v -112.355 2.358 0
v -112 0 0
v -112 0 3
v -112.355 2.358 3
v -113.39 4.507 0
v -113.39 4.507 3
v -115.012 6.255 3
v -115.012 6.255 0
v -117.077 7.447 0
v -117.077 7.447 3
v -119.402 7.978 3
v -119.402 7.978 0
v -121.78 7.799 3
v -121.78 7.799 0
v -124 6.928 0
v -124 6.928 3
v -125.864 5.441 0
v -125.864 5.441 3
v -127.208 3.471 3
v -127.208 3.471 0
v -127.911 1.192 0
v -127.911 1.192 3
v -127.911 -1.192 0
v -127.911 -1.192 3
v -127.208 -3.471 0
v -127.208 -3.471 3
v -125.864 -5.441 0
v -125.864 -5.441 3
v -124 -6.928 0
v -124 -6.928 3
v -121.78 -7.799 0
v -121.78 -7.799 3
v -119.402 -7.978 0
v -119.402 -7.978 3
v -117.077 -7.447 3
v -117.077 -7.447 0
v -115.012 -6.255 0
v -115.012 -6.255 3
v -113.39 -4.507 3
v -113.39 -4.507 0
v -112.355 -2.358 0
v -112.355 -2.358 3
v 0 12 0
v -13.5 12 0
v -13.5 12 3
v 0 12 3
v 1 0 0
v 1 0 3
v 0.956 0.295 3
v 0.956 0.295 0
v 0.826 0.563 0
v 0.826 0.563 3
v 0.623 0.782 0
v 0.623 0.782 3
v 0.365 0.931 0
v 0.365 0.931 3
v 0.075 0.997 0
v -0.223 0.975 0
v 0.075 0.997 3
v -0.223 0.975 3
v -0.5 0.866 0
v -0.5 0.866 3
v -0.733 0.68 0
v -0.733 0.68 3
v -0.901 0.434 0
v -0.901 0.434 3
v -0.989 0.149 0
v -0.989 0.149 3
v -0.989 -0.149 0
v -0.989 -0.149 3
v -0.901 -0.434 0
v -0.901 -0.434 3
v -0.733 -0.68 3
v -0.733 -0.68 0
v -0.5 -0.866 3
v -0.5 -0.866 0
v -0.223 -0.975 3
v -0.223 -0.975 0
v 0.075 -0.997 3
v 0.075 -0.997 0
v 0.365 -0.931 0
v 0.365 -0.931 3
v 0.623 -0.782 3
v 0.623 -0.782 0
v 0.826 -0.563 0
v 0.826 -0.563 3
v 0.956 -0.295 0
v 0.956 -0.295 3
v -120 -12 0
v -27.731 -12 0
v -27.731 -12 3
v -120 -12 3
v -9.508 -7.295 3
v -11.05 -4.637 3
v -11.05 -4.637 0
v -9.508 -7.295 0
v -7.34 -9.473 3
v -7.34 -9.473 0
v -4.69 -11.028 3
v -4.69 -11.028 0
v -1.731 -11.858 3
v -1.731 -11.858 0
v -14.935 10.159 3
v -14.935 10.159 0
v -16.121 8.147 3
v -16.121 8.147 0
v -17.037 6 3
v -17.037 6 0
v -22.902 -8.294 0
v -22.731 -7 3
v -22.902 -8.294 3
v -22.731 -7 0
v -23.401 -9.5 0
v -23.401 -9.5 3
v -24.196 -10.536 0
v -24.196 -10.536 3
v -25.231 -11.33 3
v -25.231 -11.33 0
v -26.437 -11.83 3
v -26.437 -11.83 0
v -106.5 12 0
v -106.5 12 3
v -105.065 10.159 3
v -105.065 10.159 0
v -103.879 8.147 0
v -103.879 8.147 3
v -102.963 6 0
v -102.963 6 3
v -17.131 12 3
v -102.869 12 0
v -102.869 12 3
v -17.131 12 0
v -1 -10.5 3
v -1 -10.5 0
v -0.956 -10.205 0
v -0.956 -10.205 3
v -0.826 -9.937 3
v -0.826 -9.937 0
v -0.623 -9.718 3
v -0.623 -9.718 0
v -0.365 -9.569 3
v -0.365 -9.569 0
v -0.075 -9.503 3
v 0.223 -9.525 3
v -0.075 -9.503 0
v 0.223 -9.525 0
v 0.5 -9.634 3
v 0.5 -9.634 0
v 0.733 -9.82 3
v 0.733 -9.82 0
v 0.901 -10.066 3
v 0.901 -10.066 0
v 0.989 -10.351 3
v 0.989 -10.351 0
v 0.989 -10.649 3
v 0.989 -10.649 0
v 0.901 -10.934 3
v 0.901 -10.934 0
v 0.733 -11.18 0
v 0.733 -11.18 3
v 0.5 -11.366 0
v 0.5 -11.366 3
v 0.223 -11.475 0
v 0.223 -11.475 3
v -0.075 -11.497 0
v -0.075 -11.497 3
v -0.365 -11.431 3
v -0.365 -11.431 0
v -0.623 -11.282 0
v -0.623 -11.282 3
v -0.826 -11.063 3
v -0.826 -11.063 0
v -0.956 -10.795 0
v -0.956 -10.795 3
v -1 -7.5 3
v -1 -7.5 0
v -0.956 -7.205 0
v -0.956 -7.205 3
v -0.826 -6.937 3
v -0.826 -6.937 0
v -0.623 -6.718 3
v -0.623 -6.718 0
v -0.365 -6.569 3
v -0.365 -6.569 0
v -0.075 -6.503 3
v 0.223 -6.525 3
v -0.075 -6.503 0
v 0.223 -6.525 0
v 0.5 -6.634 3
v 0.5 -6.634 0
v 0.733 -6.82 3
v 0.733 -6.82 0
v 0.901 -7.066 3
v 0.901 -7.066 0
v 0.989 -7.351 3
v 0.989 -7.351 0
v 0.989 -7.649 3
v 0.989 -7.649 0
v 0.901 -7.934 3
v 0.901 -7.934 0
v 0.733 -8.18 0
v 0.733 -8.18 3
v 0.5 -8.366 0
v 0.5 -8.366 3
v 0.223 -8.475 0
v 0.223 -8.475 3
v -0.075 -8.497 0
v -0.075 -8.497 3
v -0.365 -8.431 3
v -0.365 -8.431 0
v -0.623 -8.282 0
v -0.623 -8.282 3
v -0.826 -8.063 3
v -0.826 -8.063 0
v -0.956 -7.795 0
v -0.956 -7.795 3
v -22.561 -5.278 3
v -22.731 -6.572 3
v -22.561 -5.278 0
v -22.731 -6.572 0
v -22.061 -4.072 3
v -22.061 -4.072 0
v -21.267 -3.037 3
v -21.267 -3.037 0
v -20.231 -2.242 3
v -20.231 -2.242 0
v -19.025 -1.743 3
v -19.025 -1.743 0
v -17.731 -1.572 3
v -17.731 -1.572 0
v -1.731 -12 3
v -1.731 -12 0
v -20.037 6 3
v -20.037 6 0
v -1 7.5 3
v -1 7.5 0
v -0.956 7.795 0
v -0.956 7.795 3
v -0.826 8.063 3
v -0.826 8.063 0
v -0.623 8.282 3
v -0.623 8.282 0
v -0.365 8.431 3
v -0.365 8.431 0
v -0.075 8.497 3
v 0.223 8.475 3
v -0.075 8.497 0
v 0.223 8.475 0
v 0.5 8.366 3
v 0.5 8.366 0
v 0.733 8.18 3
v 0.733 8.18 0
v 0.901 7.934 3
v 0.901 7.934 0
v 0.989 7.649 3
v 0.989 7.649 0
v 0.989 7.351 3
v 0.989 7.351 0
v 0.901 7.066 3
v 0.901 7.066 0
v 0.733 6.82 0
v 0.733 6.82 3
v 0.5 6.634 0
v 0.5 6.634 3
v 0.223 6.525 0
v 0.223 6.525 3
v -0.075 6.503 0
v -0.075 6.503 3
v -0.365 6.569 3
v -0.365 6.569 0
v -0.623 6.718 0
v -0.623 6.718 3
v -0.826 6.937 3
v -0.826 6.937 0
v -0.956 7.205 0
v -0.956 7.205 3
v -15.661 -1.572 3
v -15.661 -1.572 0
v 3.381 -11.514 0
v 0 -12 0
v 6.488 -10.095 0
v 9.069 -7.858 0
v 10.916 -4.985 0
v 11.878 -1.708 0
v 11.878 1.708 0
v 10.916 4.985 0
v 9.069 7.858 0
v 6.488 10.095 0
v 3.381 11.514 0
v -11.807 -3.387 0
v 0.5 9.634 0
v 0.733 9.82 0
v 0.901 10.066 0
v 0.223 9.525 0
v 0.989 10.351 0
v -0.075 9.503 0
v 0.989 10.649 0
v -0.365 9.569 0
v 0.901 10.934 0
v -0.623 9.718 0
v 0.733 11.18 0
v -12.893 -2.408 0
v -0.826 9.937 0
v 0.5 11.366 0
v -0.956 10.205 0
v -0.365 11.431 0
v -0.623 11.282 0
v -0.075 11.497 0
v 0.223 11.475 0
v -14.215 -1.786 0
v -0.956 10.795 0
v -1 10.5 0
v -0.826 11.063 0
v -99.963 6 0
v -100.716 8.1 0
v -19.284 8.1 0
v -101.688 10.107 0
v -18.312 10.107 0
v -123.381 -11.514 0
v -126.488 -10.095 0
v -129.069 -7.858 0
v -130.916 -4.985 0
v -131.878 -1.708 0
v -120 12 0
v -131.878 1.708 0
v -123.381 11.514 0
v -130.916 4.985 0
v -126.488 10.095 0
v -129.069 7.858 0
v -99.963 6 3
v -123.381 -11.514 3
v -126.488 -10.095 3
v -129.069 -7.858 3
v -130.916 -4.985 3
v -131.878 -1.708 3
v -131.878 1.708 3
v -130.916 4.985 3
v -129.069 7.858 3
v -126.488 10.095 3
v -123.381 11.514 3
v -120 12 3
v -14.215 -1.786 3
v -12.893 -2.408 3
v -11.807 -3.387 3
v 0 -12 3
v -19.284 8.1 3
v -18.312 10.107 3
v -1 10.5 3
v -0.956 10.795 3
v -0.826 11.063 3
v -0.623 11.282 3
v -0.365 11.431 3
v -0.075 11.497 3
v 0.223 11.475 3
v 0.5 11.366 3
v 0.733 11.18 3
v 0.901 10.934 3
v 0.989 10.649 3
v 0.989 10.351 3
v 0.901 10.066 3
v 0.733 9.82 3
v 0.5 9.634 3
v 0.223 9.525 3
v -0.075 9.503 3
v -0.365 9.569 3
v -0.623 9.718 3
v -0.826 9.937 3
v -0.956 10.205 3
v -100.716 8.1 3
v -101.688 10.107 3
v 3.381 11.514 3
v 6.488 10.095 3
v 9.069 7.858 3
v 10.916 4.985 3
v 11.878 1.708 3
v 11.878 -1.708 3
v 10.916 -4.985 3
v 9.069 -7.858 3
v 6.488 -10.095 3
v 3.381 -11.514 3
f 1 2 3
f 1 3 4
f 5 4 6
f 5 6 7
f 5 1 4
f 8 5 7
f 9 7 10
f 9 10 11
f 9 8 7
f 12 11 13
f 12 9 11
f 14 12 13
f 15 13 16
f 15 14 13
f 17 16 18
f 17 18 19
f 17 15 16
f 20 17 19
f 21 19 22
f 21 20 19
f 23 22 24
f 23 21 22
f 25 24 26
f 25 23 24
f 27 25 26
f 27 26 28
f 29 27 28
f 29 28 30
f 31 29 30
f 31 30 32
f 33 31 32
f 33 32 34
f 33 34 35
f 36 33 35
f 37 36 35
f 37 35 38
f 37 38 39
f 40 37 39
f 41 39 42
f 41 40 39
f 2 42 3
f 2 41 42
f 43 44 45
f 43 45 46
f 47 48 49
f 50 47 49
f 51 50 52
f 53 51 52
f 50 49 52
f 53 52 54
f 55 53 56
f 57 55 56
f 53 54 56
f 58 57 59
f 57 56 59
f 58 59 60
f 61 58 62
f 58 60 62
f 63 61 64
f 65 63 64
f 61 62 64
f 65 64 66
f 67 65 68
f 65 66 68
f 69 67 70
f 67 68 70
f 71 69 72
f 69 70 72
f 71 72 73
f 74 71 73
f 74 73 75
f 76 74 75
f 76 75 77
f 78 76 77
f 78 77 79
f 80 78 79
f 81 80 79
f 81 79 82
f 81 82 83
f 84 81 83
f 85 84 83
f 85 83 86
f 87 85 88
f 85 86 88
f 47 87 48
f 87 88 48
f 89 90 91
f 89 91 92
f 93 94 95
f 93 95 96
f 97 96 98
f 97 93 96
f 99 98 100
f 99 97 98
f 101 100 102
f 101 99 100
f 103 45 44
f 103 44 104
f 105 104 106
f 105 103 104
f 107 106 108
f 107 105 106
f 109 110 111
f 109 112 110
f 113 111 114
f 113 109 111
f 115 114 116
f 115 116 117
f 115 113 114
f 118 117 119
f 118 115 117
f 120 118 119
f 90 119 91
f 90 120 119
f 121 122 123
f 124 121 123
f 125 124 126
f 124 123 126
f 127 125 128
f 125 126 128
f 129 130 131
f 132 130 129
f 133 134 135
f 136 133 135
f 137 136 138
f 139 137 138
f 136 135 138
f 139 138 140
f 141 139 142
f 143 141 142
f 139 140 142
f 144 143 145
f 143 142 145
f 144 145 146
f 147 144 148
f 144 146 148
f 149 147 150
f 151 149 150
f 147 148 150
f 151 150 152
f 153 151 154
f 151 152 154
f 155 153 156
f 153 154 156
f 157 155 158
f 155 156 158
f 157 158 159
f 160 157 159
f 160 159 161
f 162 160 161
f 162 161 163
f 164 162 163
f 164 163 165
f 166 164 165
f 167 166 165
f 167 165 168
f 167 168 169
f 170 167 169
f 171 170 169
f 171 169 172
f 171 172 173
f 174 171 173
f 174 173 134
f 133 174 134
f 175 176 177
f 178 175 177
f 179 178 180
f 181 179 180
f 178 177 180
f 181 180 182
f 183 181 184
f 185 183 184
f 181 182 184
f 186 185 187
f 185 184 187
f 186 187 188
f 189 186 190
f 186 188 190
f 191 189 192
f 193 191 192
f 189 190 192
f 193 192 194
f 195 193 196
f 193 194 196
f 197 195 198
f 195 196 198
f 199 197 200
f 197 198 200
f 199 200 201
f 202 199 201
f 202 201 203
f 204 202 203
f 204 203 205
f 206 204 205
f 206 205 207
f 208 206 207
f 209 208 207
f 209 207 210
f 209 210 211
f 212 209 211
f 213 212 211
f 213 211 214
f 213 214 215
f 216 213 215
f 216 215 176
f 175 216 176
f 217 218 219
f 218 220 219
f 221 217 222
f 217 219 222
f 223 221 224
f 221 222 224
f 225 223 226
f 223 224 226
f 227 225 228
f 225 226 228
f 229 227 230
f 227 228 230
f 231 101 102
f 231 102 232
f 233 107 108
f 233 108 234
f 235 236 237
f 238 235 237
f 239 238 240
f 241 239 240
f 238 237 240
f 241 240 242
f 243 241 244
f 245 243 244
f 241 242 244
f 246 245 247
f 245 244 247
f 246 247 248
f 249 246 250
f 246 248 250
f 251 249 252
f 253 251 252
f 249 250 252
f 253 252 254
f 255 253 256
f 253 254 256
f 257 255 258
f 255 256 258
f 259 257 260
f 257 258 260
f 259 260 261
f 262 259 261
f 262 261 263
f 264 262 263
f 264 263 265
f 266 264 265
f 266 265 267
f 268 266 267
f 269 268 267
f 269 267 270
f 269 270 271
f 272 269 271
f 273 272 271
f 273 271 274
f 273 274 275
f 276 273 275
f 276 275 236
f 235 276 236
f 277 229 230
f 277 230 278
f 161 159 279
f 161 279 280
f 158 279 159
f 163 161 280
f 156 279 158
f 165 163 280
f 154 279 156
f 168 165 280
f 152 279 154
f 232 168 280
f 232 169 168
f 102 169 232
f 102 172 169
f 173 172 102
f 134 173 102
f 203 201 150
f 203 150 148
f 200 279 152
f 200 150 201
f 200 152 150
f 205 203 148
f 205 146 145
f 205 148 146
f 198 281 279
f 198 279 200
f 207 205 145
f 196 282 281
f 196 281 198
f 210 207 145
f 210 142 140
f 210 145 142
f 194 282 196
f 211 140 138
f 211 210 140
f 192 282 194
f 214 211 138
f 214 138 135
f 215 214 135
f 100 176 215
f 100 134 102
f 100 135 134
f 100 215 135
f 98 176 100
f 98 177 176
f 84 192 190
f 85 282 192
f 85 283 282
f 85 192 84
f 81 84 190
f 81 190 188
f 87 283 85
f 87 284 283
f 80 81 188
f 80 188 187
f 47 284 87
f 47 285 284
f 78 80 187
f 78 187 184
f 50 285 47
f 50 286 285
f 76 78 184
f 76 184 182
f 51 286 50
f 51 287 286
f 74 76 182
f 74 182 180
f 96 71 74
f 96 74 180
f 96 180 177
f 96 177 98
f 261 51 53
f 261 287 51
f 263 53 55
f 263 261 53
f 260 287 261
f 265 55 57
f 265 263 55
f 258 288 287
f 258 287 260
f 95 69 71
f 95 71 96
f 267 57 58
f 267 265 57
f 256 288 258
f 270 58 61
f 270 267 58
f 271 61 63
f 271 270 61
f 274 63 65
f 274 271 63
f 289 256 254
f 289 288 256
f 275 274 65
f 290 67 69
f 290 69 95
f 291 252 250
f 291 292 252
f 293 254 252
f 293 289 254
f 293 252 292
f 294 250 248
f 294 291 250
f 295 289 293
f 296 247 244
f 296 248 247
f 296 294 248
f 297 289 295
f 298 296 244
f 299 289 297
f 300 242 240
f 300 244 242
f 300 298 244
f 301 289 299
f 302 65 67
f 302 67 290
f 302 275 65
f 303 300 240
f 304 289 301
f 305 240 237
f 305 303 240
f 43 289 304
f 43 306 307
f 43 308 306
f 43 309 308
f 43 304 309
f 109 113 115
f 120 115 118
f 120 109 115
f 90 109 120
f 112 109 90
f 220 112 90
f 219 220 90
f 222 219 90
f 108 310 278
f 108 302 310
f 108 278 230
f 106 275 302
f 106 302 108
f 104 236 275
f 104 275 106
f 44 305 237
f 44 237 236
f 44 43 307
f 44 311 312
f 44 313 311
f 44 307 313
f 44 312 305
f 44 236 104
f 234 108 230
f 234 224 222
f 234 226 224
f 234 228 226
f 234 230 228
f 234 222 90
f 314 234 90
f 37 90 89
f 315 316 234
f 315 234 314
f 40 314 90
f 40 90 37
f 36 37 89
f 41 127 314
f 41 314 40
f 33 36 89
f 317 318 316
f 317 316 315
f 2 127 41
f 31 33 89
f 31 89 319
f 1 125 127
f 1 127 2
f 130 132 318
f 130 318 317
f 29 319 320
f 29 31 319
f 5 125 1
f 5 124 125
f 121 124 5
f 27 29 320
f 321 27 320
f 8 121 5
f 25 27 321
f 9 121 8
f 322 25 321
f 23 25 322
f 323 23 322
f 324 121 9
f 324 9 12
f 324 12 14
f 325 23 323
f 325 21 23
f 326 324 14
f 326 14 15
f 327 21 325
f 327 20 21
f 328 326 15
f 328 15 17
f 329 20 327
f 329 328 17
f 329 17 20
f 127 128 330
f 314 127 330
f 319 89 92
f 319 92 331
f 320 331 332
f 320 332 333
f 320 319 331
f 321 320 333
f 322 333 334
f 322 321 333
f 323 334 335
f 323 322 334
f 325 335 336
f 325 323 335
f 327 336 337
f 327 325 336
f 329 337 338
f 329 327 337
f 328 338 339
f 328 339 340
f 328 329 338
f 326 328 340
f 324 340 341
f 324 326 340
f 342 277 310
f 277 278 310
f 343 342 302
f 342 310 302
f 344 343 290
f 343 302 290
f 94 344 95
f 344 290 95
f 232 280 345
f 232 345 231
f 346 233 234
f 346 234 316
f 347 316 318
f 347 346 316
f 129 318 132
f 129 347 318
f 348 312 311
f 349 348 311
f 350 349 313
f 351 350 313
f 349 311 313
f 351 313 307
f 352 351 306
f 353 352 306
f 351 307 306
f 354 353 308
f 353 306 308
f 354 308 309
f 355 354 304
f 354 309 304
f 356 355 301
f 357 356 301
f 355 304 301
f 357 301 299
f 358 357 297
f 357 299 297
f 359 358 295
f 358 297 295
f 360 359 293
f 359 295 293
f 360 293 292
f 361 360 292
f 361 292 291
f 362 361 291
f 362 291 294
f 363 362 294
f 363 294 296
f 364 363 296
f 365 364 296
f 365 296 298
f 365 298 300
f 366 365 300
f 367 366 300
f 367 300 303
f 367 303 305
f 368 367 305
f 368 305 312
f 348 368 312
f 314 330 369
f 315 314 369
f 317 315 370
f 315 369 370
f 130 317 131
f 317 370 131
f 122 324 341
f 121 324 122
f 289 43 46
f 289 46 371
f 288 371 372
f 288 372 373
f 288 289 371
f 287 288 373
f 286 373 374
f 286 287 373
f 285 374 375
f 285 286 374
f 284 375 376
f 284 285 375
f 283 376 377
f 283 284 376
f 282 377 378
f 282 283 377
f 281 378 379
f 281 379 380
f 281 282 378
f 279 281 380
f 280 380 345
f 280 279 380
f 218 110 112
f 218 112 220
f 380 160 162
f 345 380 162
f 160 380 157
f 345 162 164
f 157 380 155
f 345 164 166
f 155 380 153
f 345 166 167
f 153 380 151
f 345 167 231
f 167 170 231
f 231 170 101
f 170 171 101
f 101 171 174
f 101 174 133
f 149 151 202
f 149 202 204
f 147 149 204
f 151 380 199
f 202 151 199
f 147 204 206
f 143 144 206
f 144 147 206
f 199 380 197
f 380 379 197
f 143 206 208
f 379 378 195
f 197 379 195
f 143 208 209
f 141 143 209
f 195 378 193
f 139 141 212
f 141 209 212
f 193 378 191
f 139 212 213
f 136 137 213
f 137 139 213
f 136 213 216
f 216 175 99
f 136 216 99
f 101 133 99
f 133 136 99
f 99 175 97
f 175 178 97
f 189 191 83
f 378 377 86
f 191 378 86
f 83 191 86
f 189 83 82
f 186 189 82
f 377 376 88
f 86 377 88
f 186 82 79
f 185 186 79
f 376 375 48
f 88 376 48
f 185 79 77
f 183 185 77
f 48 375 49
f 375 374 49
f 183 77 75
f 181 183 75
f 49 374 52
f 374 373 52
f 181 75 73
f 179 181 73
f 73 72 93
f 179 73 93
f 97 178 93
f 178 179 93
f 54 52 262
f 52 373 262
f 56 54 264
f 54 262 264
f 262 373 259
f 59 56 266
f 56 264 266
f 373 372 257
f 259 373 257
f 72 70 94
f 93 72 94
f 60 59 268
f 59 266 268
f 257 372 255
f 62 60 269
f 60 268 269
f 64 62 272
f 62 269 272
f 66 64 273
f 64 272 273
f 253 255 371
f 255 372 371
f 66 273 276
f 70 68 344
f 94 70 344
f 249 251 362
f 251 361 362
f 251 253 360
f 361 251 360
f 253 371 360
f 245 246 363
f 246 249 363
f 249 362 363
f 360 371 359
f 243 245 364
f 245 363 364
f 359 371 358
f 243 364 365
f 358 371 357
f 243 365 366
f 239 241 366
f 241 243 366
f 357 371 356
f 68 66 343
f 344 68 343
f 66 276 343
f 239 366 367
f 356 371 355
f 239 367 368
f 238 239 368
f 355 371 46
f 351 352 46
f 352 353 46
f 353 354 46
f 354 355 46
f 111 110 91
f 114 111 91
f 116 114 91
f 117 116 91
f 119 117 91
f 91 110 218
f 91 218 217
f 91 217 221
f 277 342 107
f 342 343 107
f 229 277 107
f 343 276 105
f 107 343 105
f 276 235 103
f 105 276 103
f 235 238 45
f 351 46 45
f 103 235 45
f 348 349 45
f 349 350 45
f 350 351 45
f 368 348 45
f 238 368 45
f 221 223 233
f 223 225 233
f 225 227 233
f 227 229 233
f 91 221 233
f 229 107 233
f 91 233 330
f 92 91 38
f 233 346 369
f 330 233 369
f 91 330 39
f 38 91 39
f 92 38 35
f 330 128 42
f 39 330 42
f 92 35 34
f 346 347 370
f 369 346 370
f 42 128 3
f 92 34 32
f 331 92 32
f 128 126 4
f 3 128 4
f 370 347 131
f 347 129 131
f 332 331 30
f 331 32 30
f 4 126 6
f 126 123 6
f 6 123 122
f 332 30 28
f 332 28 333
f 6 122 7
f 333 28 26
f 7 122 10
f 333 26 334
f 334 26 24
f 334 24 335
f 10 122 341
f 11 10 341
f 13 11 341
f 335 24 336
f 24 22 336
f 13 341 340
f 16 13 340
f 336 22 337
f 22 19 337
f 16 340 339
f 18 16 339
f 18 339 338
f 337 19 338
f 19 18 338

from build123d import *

# Parameters (mm, degrees)
SKETCH1_R           = 8
BOSS_EXTRUDE1_DEPTH = 3
CUT_EXTRUDE1_DEPTH  = 133.578278764
CUT_EXTRUDE8_DEPTH  = 10
FILLET2_R           = 5
FILLET3_R           = 5
FILLET4_R           = 5
SKETCH6_R           = 9.723108926
SKETCH6_R_2         = 1
BOSS_EXTRUDE2_DEPTH = 3
SKETCH10_R          = 1
CUT_EXTRUDE9_DEPTH  = 10


with BuildPart() as part:
    # Sketch1 → Boss-Extrude1 (new body)
    with BuildSketch(Plane.XY):
        with BuildLine():
            Line((0, -12), (-120, -12))
            ThreePointArc((-120, -12), (-132, 0), (-120, 12))
            Line((-120, 12), (0, 12))
            ThreePointArc((0, 12), (12, 0), (0, -12))
        make_face()
        with Locations((-120, 0)):
            Circle(SKETCH1_R, mode=Mode.SUBTRACT)
        with Locations(Location((0, 0, 0), (0, 0, 180))):
            Circle(SKETCH1_R, mode=Mode.SUBTRACT)
    extrude(amount=BOSS_EXTRUDE1_DEPTH)

    # Sketch2 → Cut-Extrude1 (cut, through all)
    with BuildSketch(Plane.XY.offset(3)):
        with BuildLine():
            Line((-17.036725037, 6), (-20.036725037, 6))
            ThreePointArc((-20.036725037, 6), (-18.824439071, 9.116514898), (-17.130976336, 12))
            Line((-17.130976336, 12), (-13.5, 12))
            ThreePointArc((-13.5, 12), (-15.560298648, 9.172082969), (-17.036725037, 6))
        make_face()
        with BuildLine():
            Line((-102.963274963, 6), (-99.963274963, 6))
            ThreePointArc((-99.963274963, 6), (-101.175560929, 9.116514898), (-102.869023664, 12))
            Line((-102.869023664, 12), (-106.5, 12))
            ThreePointArc((-106.5, 12), (-104.439701352, 9.172082969), (-102.963274963, 6))
        make_face()
    extrude(amount=-CUT_EXTRUDE1_DEPTH, mode=Mode.SUBTRACT)

    # Sketch5 → Cut-Extrude8 (cut)
    with BuildSketch(Plane.XY.offset(3)):
        with BuildLine():
            Line((-1.731193523, -11.858337769), (-1.731193523, -12))
            Line((-1.731193523, -12), (-22.731193523, -12))
            Line((-22.731193523, -12), (-22.731193523, -2.344249067))
            Line((-22.731193523, -2.344249067), (-22.731193523, -1.572214532))
            Line((-22.731193523, -1.572214532), (-11.880460729, -1.572214532))
            ThreePointArc((-11.880460729, -1.572214532), (-8.530554828, -8.417056492), (-1.731193523, -11.858337769))
        make_face()
    extrude(amount=-CUT_EXTRUDE8_DEPTH, mode=Mode.SUBTRACT)

    # Fillet2
    fillet2_edges = [part.edges().sort_by_distance(p)[0] for p in [
        (-22.731193523, -1.572214532, 1.5),
    ]]
    fillet(fillet2_edges, radius=FILLET2_R)

    # Fillet3
    fillet3_edges = [part.edges().sort_by_distance(p)[0] for p in [
        (-11.880460729, -1.572214532, 1.5),
    ]]
    fillet(fillet3_edges, radius=FILLET3_R)

    # Fillet4
    fillet4_edges = [part.edges().sort_by_distance(p)[0] for p in [
        (-22.731193523, -12, 1.5),
    ]]
    fillet(fillet4_edges, radius=FILLET4_R)

    # Sketch6 → Boss-Extrude2 (add)
    with BuildSketch(Plane.XY.offset(3)):
        Circle(SKETCH6_R)
        Circle(SKETCH6_R_2, mode=Mode.SUBTRACT)
    extrude(amount=-BOSS_EXTRUDE2_DEPTH)

    # Sketch10 → Cut-Extrude9 (cut)
    with BuildSketch(Plane(origin=(0, 0, 0), x_dir=(-1, 0, 0), z_dir=(0, 0, -1))):
        with Locations((0, 10.5)):
            Circle(SKETCH10_R)
        with Locations((0, 7.5)):
            Circle(SKETCH10_R)
        with Locations((0, -7.5)):
            Circle(SKETCH10_R)
        with Locations((0, -10.5)):
            Circle(SKETCH10_R)
    extrude(amount=-CUT_EXTRUDE9_DEPTH, mode=Mode.SUBTRACT)


solid = part.part
